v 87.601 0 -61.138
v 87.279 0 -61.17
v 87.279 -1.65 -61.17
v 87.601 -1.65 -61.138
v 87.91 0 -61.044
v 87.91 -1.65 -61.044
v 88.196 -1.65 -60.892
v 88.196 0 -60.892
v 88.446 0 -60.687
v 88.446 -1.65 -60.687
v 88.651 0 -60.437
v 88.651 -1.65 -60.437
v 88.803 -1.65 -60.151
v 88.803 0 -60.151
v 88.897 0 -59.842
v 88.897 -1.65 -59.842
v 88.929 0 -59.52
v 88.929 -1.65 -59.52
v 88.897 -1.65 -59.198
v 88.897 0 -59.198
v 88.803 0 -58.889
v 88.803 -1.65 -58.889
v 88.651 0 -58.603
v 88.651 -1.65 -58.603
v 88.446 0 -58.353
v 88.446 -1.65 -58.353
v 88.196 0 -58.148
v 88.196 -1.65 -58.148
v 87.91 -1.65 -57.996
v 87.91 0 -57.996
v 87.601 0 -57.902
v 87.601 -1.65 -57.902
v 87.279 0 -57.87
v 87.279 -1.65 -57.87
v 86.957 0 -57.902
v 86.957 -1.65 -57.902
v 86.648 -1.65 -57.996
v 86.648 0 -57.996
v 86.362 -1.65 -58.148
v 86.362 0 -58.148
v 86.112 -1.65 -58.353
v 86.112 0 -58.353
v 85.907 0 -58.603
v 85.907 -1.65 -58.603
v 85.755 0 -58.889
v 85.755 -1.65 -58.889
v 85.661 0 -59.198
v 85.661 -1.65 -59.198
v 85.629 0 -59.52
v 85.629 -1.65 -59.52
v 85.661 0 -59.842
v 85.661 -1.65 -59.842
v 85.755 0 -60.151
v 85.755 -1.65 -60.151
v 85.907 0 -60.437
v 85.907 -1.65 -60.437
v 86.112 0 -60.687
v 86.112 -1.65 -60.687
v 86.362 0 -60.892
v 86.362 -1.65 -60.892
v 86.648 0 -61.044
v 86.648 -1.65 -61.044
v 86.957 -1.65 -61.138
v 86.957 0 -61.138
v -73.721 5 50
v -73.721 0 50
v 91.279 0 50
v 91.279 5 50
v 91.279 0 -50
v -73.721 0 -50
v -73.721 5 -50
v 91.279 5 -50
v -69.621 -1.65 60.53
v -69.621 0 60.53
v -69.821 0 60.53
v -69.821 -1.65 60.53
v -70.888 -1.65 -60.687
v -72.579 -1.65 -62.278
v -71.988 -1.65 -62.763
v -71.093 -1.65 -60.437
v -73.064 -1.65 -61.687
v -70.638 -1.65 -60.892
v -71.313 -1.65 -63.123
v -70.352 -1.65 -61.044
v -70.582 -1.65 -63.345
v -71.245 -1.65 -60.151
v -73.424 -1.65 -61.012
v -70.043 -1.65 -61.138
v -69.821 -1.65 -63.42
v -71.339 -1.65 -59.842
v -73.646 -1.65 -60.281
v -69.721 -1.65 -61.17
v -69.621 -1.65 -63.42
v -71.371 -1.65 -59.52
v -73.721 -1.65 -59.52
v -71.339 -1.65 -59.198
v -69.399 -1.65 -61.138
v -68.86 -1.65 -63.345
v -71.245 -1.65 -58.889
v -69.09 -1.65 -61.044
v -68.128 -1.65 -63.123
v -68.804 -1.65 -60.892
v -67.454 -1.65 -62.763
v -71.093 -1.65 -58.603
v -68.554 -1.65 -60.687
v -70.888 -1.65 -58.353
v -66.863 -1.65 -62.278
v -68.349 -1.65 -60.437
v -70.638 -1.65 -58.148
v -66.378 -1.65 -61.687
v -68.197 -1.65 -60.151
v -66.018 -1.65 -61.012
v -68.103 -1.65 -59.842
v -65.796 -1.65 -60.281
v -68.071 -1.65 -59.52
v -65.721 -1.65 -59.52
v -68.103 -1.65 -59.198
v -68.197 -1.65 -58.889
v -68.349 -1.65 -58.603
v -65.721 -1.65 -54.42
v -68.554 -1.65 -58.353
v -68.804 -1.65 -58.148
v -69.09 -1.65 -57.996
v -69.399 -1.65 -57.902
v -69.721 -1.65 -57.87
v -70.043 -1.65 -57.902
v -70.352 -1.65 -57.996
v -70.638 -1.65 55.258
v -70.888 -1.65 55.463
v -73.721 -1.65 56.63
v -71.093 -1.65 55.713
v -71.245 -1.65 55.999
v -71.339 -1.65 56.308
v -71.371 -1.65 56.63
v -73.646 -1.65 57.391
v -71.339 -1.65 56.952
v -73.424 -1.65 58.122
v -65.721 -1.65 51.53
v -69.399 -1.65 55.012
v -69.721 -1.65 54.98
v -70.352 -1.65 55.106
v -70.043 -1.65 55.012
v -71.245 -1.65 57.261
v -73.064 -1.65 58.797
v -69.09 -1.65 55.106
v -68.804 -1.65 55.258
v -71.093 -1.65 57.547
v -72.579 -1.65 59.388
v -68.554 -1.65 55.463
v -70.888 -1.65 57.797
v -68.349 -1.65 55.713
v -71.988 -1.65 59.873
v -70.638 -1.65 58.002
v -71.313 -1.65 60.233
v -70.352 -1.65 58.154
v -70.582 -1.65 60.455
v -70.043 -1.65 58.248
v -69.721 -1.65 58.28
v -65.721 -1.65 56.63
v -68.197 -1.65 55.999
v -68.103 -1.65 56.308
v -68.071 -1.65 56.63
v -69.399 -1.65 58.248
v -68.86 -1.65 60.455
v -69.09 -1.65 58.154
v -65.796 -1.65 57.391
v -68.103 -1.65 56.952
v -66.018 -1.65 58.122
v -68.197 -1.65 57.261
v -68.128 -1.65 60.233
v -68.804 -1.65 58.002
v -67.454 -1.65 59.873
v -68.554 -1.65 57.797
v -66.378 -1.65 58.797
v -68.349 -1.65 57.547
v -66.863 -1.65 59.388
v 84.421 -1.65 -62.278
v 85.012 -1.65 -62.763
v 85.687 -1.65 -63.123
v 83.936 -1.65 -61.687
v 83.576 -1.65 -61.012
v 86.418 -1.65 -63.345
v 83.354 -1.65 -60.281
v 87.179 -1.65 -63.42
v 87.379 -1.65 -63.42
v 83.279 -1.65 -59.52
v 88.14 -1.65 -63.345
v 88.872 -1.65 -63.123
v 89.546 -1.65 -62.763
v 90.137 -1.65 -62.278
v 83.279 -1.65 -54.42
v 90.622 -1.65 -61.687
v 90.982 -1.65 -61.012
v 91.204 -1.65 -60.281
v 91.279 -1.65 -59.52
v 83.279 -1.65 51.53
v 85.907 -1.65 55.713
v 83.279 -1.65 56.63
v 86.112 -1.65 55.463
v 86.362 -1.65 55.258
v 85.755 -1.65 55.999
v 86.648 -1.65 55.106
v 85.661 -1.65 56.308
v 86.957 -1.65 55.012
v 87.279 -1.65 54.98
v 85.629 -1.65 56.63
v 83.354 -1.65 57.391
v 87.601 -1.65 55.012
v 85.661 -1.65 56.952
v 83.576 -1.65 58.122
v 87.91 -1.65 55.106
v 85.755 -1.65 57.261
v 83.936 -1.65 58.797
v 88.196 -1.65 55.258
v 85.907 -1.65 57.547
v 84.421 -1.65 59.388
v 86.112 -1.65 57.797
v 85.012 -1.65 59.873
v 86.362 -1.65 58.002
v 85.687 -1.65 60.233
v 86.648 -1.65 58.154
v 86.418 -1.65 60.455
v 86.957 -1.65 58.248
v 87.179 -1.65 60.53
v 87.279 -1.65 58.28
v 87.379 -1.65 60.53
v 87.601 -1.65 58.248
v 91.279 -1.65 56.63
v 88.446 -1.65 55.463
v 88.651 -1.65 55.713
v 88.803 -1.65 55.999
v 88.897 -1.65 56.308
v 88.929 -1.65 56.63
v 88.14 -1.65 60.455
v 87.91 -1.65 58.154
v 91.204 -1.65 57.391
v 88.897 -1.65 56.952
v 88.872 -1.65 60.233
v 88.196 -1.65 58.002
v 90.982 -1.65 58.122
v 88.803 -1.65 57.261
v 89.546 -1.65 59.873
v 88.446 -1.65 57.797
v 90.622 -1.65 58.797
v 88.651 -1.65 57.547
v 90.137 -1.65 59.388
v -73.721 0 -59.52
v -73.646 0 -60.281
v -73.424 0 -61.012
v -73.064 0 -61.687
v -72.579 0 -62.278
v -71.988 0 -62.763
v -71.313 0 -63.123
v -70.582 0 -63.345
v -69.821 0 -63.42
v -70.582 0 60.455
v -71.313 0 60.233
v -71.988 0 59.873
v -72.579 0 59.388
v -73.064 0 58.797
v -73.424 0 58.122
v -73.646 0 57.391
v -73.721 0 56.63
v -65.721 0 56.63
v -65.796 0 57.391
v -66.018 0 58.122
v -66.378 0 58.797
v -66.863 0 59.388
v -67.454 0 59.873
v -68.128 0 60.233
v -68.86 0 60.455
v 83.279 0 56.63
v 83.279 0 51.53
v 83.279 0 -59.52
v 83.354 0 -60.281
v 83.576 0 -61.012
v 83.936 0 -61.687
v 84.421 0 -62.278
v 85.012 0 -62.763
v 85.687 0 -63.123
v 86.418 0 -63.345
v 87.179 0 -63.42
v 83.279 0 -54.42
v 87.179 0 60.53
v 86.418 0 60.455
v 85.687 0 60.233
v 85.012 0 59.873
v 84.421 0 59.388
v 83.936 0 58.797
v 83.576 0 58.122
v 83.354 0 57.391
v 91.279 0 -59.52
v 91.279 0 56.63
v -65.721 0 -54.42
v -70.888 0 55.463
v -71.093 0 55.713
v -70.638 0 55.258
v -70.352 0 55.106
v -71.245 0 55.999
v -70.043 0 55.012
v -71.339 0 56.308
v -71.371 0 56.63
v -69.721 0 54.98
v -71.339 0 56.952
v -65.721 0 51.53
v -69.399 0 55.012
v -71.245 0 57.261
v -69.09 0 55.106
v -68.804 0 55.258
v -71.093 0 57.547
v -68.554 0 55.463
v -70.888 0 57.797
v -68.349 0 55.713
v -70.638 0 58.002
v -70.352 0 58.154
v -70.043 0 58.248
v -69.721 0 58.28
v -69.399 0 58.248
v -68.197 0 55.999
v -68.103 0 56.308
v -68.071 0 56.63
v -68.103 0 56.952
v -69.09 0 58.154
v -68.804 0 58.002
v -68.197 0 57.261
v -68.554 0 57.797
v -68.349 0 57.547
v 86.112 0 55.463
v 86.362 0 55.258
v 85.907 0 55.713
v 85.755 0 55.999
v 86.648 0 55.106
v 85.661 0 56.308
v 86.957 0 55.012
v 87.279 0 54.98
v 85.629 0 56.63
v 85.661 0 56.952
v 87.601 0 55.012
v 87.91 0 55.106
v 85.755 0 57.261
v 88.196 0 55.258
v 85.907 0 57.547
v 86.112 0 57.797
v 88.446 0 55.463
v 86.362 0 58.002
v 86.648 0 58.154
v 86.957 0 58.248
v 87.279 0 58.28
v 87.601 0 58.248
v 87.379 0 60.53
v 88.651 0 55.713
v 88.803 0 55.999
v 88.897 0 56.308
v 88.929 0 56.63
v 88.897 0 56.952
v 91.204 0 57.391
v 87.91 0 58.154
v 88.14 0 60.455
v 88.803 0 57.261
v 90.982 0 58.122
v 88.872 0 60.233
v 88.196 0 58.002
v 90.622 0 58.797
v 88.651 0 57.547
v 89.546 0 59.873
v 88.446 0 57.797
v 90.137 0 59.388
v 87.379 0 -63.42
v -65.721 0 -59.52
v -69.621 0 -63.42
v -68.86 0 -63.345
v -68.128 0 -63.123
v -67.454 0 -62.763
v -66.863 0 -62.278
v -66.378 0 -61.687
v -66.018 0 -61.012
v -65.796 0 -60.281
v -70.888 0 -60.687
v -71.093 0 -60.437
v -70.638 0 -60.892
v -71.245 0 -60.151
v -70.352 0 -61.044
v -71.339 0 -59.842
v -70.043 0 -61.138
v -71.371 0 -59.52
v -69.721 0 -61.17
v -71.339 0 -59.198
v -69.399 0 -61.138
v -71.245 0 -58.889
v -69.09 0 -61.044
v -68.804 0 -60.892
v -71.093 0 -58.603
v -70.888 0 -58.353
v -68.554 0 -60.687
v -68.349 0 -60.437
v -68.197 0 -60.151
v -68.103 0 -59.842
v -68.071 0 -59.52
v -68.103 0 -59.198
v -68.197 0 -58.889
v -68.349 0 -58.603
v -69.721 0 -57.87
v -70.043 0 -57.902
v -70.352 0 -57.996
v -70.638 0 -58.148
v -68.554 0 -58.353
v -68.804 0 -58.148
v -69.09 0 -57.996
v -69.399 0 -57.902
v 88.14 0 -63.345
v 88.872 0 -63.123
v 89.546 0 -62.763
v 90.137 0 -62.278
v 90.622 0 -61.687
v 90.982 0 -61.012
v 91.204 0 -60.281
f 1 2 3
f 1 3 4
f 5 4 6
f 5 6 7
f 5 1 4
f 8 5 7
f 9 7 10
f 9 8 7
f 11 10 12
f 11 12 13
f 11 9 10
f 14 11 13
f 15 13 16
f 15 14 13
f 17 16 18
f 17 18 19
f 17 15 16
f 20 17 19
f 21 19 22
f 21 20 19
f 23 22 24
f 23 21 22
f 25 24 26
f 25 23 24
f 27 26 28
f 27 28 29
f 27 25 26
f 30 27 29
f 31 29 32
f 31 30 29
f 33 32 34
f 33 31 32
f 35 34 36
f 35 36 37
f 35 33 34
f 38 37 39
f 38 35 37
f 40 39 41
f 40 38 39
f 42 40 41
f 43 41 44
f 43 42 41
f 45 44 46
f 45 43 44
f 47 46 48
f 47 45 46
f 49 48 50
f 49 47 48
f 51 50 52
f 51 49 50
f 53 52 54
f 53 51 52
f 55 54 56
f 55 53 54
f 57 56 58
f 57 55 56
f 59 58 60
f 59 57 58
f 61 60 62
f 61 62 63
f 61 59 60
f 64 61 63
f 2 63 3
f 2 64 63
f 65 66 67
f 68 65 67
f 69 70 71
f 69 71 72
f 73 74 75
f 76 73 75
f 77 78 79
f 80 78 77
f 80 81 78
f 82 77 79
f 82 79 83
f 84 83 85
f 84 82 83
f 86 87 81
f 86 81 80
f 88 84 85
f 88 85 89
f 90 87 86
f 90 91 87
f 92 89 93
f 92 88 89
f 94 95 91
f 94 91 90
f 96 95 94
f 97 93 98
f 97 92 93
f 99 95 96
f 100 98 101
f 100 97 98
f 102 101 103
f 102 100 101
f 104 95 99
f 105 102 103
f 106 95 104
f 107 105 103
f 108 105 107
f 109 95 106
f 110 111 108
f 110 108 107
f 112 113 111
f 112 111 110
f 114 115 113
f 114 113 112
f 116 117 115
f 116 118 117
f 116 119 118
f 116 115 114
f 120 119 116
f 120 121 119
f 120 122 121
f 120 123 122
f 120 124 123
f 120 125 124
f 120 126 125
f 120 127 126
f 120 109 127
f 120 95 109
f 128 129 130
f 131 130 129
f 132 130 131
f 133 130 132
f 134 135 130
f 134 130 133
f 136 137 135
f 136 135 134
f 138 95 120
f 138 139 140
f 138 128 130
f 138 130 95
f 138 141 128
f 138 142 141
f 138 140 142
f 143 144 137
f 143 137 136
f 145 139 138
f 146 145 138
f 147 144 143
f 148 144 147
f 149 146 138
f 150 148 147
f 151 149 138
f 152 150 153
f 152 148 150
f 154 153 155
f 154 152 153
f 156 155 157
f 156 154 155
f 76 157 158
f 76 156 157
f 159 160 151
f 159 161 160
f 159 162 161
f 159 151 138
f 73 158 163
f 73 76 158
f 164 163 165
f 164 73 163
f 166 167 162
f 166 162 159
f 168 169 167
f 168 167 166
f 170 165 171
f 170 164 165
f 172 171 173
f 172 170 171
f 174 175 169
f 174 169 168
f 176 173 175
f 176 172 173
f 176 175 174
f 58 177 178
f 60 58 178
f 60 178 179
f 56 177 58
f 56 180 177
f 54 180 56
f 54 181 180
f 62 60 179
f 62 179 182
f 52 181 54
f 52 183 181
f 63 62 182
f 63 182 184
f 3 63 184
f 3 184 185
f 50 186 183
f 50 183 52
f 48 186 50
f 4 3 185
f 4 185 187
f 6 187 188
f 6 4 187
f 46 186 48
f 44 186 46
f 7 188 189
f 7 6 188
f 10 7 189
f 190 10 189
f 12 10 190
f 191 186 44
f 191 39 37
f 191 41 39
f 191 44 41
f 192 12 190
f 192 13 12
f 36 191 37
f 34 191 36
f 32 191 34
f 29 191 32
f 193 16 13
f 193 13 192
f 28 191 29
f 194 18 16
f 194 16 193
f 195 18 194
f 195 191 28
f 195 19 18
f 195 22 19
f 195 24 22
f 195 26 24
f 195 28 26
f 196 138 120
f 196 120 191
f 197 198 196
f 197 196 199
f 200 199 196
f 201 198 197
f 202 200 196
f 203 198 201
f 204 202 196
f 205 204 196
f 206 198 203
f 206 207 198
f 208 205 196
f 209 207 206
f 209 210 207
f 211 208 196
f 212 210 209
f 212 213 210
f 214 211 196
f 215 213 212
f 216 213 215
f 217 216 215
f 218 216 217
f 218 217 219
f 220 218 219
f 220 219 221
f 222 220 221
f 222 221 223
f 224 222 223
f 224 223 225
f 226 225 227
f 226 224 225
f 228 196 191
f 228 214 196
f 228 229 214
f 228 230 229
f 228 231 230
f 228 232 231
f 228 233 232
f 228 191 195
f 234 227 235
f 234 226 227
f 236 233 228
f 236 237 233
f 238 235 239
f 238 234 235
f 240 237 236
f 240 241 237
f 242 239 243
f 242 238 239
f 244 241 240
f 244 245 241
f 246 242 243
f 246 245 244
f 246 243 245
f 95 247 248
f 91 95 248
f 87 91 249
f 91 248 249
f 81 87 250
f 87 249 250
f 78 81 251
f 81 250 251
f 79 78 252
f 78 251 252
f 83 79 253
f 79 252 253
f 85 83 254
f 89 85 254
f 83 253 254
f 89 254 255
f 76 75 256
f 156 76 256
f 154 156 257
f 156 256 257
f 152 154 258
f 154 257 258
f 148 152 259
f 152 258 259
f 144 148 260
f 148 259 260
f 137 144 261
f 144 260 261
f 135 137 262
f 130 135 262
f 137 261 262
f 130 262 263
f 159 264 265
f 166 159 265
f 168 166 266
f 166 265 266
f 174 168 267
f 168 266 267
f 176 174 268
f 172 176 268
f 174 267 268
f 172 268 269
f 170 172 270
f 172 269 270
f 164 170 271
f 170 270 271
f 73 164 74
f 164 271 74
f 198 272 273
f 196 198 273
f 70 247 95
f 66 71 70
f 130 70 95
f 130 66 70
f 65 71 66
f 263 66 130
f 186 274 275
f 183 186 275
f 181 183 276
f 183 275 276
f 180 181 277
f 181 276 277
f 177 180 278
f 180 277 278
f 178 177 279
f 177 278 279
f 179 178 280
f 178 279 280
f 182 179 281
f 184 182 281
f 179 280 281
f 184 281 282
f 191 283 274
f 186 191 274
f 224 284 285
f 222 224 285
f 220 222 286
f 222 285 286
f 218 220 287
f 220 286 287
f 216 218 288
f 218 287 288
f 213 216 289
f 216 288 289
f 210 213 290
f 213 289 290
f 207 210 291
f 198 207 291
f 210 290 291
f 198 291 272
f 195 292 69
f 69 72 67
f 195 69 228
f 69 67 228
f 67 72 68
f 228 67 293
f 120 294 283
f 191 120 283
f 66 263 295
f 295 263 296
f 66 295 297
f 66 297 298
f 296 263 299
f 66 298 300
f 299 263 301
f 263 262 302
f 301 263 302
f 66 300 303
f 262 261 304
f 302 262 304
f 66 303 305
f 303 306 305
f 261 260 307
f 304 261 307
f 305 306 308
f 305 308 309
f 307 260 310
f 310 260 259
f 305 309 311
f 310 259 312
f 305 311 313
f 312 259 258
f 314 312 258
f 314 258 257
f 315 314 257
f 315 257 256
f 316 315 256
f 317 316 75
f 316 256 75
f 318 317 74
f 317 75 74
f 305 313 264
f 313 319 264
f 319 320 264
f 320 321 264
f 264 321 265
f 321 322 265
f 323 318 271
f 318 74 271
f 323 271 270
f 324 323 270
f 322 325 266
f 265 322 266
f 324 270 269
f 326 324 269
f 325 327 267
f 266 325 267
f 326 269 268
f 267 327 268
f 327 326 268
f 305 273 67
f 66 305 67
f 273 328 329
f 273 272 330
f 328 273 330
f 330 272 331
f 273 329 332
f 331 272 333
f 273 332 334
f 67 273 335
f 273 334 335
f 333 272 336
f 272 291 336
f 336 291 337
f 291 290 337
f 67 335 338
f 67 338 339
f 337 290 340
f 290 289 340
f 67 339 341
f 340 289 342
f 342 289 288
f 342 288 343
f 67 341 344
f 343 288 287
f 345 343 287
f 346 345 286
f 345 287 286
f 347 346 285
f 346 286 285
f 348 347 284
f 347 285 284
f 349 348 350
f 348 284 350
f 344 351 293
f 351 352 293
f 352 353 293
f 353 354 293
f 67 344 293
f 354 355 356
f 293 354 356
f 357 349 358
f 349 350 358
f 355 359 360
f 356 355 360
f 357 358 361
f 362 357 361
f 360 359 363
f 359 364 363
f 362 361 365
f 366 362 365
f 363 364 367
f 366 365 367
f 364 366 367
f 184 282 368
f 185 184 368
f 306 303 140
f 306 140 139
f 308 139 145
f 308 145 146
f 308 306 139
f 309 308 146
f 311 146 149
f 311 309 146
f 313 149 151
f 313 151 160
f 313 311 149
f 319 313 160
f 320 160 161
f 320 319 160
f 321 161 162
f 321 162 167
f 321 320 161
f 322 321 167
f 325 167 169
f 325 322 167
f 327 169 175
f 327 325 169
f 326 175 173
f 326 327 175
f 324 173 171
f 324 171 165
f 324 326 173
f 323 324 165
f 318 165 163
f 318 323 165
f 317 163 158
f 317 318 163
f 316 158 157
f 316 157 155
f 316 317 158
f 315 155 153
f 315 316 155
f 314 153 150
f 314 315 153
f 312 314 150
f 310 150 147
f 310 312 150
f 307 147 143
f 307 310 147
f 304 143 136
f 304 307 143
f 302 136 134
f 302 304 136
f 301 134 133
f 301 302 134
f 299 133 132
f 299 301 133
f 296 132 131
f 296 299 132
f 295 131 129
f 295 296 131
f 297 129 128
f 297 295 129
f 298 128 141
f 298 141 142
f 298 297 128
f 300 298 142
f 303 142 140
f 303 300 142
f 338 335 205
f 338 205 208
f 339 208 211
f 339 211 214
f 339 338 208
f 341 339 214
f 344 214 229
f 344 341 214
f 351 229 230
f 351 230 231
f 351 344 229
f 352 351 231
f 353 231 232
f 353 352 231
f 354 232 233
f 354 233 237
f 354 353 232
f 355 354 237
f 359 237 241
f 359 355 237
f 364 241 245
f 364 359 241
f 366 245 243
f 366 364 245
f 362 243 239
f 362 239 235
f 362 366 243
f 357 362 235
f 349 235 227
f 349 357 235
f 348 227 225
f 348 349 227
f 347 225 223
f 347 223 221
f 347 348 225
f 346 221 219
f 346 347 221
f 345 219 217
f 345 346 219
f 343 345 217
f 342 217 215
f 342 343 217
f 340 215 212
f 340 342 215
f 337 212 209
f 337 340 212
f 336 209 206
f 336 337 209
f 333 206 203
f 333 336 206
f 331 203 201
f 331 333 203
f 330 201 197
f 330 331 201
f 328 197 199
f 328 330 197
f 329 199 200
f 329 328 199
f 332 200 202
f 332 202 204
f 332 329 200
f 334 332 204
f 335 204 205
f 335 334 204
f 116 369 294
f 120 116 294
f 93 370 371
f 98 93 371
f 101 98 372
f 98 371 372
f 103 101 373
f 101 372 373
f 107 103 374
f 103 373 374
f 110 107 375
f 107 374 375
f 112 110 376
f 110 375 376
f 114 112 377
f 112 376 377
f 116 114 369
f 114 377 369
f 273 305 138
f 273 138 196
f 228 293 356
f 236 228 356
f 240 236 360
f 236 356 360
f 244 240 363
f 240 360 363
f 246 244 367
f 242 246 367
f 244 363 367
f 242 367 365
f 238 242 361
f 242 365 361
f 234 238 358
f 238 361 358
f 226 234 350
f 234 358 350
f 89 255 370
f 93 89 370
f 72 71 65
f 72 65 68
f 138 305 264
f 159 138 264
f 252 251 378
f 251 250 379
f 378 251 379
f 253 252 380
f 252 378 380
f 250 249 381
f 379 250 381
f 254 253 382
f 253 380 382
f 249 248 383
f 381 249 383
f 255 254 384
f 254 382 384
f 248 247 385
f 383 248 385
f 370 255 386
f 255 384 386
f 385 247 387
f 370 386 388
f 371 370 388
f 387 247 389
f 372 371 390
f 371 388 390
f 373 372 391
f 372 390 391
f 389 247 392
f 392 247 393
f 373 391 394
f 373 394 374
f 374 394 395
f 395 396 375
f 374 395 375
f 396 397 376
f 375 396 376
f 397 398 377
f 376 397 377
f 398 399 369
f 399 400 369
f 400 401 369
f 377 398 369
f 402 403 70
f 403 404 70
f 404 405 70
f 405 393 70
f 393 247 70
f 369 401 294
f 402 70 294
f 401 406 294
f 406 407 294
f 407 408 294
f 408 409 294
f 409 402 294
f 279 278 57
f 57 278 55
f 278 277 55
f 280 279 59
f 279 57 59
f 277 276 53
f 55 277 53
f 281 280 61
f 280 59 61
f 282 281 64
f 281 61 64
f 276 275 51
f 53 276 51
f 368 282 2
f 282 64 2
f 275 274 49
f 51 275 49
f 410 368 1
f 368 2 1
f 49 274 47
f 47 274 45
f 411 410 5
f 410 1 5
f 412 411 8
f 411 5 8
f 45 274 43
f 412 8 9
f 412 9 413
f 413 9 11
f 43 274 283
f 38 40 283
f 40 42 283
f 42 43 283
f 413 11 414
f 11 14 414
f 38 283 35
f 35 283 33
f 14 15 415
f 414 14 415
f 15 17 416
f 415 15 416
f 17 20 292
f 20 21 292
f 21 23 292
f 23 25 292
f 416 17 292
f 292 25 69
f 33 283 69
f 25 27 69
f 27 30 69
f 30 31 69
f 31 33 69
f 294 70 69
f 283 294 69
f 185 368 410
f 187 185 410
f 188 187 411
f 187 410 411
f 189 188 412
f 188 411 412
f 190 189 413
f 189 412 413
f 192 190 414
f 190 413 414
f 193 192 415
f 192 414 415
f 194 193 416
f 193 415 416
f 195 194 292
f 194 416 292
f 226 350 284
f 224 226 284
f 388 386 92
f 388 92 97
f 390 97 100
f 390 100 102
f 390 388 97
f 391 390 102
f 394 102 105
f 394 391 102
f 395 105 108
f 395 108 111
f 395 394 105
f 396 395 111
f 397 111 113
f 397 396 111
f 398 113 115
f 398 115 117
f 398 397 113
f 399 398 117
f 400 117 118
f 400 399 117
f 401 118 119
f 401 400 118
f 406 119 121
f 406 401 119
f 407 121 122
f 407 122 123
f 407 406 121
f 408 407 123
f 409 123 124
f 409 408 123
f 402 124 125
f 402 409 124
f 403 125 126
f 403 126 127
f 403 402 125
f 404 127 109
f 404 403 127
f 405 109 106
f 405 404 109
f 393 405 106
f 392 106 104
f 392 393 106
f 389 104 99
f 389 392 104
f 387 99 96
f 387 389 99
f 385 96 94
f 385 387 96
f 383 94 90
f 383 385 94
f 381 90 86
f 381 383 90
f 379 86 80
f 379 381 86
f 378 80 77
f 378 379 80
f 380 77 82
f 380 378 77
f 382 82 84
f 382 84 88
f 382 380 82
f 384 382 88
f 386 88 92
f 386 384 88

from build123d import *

# Parameters (mm, degrees)
SKETCH_1_W      = 165
SKETCH_1_H      = 100
EXTRUDE_1_DEPTH = 5
SKETCH_2_R      = 1.65
SKETCH_2_W      = 165
SKETCH_2_H      = 1.53
SKETCH_2_H_2    = 4.42
SKETCH_2_H_3    = 100
EXTRUDE_2_DEPTH = 1.65


with BuildPart() as part:
    # 草图1 → 凸台-拉伸1 (new body)
    with BuildSketch(Plane(origin=(0, 0, 0), x_dir=(1, 0, 0), z_dir=(0, 1, 0))):
        with Locations((8.779069767, 0)):
            Rectangle(SKETCH_1_W, SKETCH_1_H)
    extrude(amount=EXTRUDE_1_DEPTH)

    # 草图2 → 凸台-拉伸2 (add)
    # profile 1 of 7: a face of its own
    with BuildSketch(Plane.XZ):
        with BuildLine():
            Line((83.279069767, 51.53), (91.279069767, 51.53))
            Line((91.279069767, 51.53), (91.279069767, 56.63))
            ThreePointArc((91.279069767, 56.63), (90.136786214, 59.387716447), (87.379069767, 60.53))
            Line((87.379069767, 60.53), (87.179069767, 60.53))
            ThreePointArc((87.179069767, 60.53), (84.421353321, 59.387716447), (83.279069767, 56.63))
            Line((83.279069767, 56.63), (83.279069767, 51.53))
        make_face()
        with Locations(Location((87.279069767, 56.63, 0), (0, 0, 270))):
            Circle(SKETCH_2_R, mode=Mode.SUBTRACT)
    # profile 2 of 7: a face of its own
    with BuildSketch(Plane.XZ):
        with Locations((8.779069767, 50.765)):
            Rectangle(SKETCH_2_W, SKETCH_2_H)
    # profile 3 of 7: a face of its own
    with BuildSketch(Plane.XZ):
        with BuildLine():
            Line((-73.720930233, 56.63), (-73.720930233, 51.53))
            Line((-73.720930233, 51.53), (-65.720930233, 51.53))
            Line((-65.720930233, 51.53), (-65.720930233, 56.63))
            ThreePointArc((-65.720930233, 56.63), (-66.863213786, 59.387716447), (-69.620930233, 60.53))
            Line((-69.620930233, 60.53), (-69.820930233, 60.53))
            ThreePointArc((-69.820930233, 60.53), (-72.578646679, 59.387716447), (-73.720930233, 56.63))
        make_face()
        with Locations(Location((-69.720930233, 56.63, 0), (0, 0, 270))):
            Circle(SKETCH_2_R, mode=Mode.SUBTRACT)
    # profile 4 of 7: a face of its own
    with BuildSketch(Plane.XZ):
        with BuildLine():
            Line((-65.720930233, -54.42), (-73.720930233, -54.42))
            Line((-73.720930233, -54.42), (-73.720930233, -59.52))
            ThreePointArc((-73.720930233, -59.52), (-72.578646679, -62.277716447), (-69.820930233, -63.42))
            Line((-69.820930233, -63.42), (-69.620930233, -63.42))
            ThreePointArc((-69.620930233, -63.42), (-66.863213786, -62.277716447), (-65.720930233, -59.52))
            Line((-65.720930233, -59.52), (-65.720930233, -54.42))
        make_face()
        with Locations(Location((-69.720930233, -59.52, 0), (0, 0, 270))):
            Circle(SKETCH_2_R, mode=Mode.SUBTRACT)
    # profile 5 of 7: a face of its own
    with BuildSketch(Plane.XZ):
        with Locations((8.779069767, -52.21)):
            Rectangle(SKETCH_2_W, SKETCH_2_H_2)
    # profile 6 of 7: a face of its own
    with BuildSketch(Plane.XZ):
        with BuildLine():
            Line((91.279069767, -59.52), (91.279069767, -54.42))
            Line((91.279069767, -54.42), (83.279069767, -54.42))
            Line((83.279069767, -54.42), (83.279069767, -59.52))
            ThreePointArc((83.279069767, -59.52), (84.421353321, -62.277716447), (87.179069767, -63.42))
            Line((87.179069767, -63.42), (87.379069767, -63.42))
            ThreePointArc((87.379069767, -63.42), (90.136786214, -62.277716447), (91.279069767, -59.52))
        make_face()
        with Locations(Location((87.279069767, -59.52, 0), (0, 0, 270))):
            Circle(SKETCH_2_R, mode=Mode.SUBTRACT)
    # profile 7 of 7: a face of its own
    with BuildSketch(Plane.XZ):
        with Locations((8.779069767, 0)):
            Rectangle(SKETCH_2_W, SKETCH_2_H_3)
    extrude(amount=EXTRUDE_2_DEPTH)


solid = part.part
